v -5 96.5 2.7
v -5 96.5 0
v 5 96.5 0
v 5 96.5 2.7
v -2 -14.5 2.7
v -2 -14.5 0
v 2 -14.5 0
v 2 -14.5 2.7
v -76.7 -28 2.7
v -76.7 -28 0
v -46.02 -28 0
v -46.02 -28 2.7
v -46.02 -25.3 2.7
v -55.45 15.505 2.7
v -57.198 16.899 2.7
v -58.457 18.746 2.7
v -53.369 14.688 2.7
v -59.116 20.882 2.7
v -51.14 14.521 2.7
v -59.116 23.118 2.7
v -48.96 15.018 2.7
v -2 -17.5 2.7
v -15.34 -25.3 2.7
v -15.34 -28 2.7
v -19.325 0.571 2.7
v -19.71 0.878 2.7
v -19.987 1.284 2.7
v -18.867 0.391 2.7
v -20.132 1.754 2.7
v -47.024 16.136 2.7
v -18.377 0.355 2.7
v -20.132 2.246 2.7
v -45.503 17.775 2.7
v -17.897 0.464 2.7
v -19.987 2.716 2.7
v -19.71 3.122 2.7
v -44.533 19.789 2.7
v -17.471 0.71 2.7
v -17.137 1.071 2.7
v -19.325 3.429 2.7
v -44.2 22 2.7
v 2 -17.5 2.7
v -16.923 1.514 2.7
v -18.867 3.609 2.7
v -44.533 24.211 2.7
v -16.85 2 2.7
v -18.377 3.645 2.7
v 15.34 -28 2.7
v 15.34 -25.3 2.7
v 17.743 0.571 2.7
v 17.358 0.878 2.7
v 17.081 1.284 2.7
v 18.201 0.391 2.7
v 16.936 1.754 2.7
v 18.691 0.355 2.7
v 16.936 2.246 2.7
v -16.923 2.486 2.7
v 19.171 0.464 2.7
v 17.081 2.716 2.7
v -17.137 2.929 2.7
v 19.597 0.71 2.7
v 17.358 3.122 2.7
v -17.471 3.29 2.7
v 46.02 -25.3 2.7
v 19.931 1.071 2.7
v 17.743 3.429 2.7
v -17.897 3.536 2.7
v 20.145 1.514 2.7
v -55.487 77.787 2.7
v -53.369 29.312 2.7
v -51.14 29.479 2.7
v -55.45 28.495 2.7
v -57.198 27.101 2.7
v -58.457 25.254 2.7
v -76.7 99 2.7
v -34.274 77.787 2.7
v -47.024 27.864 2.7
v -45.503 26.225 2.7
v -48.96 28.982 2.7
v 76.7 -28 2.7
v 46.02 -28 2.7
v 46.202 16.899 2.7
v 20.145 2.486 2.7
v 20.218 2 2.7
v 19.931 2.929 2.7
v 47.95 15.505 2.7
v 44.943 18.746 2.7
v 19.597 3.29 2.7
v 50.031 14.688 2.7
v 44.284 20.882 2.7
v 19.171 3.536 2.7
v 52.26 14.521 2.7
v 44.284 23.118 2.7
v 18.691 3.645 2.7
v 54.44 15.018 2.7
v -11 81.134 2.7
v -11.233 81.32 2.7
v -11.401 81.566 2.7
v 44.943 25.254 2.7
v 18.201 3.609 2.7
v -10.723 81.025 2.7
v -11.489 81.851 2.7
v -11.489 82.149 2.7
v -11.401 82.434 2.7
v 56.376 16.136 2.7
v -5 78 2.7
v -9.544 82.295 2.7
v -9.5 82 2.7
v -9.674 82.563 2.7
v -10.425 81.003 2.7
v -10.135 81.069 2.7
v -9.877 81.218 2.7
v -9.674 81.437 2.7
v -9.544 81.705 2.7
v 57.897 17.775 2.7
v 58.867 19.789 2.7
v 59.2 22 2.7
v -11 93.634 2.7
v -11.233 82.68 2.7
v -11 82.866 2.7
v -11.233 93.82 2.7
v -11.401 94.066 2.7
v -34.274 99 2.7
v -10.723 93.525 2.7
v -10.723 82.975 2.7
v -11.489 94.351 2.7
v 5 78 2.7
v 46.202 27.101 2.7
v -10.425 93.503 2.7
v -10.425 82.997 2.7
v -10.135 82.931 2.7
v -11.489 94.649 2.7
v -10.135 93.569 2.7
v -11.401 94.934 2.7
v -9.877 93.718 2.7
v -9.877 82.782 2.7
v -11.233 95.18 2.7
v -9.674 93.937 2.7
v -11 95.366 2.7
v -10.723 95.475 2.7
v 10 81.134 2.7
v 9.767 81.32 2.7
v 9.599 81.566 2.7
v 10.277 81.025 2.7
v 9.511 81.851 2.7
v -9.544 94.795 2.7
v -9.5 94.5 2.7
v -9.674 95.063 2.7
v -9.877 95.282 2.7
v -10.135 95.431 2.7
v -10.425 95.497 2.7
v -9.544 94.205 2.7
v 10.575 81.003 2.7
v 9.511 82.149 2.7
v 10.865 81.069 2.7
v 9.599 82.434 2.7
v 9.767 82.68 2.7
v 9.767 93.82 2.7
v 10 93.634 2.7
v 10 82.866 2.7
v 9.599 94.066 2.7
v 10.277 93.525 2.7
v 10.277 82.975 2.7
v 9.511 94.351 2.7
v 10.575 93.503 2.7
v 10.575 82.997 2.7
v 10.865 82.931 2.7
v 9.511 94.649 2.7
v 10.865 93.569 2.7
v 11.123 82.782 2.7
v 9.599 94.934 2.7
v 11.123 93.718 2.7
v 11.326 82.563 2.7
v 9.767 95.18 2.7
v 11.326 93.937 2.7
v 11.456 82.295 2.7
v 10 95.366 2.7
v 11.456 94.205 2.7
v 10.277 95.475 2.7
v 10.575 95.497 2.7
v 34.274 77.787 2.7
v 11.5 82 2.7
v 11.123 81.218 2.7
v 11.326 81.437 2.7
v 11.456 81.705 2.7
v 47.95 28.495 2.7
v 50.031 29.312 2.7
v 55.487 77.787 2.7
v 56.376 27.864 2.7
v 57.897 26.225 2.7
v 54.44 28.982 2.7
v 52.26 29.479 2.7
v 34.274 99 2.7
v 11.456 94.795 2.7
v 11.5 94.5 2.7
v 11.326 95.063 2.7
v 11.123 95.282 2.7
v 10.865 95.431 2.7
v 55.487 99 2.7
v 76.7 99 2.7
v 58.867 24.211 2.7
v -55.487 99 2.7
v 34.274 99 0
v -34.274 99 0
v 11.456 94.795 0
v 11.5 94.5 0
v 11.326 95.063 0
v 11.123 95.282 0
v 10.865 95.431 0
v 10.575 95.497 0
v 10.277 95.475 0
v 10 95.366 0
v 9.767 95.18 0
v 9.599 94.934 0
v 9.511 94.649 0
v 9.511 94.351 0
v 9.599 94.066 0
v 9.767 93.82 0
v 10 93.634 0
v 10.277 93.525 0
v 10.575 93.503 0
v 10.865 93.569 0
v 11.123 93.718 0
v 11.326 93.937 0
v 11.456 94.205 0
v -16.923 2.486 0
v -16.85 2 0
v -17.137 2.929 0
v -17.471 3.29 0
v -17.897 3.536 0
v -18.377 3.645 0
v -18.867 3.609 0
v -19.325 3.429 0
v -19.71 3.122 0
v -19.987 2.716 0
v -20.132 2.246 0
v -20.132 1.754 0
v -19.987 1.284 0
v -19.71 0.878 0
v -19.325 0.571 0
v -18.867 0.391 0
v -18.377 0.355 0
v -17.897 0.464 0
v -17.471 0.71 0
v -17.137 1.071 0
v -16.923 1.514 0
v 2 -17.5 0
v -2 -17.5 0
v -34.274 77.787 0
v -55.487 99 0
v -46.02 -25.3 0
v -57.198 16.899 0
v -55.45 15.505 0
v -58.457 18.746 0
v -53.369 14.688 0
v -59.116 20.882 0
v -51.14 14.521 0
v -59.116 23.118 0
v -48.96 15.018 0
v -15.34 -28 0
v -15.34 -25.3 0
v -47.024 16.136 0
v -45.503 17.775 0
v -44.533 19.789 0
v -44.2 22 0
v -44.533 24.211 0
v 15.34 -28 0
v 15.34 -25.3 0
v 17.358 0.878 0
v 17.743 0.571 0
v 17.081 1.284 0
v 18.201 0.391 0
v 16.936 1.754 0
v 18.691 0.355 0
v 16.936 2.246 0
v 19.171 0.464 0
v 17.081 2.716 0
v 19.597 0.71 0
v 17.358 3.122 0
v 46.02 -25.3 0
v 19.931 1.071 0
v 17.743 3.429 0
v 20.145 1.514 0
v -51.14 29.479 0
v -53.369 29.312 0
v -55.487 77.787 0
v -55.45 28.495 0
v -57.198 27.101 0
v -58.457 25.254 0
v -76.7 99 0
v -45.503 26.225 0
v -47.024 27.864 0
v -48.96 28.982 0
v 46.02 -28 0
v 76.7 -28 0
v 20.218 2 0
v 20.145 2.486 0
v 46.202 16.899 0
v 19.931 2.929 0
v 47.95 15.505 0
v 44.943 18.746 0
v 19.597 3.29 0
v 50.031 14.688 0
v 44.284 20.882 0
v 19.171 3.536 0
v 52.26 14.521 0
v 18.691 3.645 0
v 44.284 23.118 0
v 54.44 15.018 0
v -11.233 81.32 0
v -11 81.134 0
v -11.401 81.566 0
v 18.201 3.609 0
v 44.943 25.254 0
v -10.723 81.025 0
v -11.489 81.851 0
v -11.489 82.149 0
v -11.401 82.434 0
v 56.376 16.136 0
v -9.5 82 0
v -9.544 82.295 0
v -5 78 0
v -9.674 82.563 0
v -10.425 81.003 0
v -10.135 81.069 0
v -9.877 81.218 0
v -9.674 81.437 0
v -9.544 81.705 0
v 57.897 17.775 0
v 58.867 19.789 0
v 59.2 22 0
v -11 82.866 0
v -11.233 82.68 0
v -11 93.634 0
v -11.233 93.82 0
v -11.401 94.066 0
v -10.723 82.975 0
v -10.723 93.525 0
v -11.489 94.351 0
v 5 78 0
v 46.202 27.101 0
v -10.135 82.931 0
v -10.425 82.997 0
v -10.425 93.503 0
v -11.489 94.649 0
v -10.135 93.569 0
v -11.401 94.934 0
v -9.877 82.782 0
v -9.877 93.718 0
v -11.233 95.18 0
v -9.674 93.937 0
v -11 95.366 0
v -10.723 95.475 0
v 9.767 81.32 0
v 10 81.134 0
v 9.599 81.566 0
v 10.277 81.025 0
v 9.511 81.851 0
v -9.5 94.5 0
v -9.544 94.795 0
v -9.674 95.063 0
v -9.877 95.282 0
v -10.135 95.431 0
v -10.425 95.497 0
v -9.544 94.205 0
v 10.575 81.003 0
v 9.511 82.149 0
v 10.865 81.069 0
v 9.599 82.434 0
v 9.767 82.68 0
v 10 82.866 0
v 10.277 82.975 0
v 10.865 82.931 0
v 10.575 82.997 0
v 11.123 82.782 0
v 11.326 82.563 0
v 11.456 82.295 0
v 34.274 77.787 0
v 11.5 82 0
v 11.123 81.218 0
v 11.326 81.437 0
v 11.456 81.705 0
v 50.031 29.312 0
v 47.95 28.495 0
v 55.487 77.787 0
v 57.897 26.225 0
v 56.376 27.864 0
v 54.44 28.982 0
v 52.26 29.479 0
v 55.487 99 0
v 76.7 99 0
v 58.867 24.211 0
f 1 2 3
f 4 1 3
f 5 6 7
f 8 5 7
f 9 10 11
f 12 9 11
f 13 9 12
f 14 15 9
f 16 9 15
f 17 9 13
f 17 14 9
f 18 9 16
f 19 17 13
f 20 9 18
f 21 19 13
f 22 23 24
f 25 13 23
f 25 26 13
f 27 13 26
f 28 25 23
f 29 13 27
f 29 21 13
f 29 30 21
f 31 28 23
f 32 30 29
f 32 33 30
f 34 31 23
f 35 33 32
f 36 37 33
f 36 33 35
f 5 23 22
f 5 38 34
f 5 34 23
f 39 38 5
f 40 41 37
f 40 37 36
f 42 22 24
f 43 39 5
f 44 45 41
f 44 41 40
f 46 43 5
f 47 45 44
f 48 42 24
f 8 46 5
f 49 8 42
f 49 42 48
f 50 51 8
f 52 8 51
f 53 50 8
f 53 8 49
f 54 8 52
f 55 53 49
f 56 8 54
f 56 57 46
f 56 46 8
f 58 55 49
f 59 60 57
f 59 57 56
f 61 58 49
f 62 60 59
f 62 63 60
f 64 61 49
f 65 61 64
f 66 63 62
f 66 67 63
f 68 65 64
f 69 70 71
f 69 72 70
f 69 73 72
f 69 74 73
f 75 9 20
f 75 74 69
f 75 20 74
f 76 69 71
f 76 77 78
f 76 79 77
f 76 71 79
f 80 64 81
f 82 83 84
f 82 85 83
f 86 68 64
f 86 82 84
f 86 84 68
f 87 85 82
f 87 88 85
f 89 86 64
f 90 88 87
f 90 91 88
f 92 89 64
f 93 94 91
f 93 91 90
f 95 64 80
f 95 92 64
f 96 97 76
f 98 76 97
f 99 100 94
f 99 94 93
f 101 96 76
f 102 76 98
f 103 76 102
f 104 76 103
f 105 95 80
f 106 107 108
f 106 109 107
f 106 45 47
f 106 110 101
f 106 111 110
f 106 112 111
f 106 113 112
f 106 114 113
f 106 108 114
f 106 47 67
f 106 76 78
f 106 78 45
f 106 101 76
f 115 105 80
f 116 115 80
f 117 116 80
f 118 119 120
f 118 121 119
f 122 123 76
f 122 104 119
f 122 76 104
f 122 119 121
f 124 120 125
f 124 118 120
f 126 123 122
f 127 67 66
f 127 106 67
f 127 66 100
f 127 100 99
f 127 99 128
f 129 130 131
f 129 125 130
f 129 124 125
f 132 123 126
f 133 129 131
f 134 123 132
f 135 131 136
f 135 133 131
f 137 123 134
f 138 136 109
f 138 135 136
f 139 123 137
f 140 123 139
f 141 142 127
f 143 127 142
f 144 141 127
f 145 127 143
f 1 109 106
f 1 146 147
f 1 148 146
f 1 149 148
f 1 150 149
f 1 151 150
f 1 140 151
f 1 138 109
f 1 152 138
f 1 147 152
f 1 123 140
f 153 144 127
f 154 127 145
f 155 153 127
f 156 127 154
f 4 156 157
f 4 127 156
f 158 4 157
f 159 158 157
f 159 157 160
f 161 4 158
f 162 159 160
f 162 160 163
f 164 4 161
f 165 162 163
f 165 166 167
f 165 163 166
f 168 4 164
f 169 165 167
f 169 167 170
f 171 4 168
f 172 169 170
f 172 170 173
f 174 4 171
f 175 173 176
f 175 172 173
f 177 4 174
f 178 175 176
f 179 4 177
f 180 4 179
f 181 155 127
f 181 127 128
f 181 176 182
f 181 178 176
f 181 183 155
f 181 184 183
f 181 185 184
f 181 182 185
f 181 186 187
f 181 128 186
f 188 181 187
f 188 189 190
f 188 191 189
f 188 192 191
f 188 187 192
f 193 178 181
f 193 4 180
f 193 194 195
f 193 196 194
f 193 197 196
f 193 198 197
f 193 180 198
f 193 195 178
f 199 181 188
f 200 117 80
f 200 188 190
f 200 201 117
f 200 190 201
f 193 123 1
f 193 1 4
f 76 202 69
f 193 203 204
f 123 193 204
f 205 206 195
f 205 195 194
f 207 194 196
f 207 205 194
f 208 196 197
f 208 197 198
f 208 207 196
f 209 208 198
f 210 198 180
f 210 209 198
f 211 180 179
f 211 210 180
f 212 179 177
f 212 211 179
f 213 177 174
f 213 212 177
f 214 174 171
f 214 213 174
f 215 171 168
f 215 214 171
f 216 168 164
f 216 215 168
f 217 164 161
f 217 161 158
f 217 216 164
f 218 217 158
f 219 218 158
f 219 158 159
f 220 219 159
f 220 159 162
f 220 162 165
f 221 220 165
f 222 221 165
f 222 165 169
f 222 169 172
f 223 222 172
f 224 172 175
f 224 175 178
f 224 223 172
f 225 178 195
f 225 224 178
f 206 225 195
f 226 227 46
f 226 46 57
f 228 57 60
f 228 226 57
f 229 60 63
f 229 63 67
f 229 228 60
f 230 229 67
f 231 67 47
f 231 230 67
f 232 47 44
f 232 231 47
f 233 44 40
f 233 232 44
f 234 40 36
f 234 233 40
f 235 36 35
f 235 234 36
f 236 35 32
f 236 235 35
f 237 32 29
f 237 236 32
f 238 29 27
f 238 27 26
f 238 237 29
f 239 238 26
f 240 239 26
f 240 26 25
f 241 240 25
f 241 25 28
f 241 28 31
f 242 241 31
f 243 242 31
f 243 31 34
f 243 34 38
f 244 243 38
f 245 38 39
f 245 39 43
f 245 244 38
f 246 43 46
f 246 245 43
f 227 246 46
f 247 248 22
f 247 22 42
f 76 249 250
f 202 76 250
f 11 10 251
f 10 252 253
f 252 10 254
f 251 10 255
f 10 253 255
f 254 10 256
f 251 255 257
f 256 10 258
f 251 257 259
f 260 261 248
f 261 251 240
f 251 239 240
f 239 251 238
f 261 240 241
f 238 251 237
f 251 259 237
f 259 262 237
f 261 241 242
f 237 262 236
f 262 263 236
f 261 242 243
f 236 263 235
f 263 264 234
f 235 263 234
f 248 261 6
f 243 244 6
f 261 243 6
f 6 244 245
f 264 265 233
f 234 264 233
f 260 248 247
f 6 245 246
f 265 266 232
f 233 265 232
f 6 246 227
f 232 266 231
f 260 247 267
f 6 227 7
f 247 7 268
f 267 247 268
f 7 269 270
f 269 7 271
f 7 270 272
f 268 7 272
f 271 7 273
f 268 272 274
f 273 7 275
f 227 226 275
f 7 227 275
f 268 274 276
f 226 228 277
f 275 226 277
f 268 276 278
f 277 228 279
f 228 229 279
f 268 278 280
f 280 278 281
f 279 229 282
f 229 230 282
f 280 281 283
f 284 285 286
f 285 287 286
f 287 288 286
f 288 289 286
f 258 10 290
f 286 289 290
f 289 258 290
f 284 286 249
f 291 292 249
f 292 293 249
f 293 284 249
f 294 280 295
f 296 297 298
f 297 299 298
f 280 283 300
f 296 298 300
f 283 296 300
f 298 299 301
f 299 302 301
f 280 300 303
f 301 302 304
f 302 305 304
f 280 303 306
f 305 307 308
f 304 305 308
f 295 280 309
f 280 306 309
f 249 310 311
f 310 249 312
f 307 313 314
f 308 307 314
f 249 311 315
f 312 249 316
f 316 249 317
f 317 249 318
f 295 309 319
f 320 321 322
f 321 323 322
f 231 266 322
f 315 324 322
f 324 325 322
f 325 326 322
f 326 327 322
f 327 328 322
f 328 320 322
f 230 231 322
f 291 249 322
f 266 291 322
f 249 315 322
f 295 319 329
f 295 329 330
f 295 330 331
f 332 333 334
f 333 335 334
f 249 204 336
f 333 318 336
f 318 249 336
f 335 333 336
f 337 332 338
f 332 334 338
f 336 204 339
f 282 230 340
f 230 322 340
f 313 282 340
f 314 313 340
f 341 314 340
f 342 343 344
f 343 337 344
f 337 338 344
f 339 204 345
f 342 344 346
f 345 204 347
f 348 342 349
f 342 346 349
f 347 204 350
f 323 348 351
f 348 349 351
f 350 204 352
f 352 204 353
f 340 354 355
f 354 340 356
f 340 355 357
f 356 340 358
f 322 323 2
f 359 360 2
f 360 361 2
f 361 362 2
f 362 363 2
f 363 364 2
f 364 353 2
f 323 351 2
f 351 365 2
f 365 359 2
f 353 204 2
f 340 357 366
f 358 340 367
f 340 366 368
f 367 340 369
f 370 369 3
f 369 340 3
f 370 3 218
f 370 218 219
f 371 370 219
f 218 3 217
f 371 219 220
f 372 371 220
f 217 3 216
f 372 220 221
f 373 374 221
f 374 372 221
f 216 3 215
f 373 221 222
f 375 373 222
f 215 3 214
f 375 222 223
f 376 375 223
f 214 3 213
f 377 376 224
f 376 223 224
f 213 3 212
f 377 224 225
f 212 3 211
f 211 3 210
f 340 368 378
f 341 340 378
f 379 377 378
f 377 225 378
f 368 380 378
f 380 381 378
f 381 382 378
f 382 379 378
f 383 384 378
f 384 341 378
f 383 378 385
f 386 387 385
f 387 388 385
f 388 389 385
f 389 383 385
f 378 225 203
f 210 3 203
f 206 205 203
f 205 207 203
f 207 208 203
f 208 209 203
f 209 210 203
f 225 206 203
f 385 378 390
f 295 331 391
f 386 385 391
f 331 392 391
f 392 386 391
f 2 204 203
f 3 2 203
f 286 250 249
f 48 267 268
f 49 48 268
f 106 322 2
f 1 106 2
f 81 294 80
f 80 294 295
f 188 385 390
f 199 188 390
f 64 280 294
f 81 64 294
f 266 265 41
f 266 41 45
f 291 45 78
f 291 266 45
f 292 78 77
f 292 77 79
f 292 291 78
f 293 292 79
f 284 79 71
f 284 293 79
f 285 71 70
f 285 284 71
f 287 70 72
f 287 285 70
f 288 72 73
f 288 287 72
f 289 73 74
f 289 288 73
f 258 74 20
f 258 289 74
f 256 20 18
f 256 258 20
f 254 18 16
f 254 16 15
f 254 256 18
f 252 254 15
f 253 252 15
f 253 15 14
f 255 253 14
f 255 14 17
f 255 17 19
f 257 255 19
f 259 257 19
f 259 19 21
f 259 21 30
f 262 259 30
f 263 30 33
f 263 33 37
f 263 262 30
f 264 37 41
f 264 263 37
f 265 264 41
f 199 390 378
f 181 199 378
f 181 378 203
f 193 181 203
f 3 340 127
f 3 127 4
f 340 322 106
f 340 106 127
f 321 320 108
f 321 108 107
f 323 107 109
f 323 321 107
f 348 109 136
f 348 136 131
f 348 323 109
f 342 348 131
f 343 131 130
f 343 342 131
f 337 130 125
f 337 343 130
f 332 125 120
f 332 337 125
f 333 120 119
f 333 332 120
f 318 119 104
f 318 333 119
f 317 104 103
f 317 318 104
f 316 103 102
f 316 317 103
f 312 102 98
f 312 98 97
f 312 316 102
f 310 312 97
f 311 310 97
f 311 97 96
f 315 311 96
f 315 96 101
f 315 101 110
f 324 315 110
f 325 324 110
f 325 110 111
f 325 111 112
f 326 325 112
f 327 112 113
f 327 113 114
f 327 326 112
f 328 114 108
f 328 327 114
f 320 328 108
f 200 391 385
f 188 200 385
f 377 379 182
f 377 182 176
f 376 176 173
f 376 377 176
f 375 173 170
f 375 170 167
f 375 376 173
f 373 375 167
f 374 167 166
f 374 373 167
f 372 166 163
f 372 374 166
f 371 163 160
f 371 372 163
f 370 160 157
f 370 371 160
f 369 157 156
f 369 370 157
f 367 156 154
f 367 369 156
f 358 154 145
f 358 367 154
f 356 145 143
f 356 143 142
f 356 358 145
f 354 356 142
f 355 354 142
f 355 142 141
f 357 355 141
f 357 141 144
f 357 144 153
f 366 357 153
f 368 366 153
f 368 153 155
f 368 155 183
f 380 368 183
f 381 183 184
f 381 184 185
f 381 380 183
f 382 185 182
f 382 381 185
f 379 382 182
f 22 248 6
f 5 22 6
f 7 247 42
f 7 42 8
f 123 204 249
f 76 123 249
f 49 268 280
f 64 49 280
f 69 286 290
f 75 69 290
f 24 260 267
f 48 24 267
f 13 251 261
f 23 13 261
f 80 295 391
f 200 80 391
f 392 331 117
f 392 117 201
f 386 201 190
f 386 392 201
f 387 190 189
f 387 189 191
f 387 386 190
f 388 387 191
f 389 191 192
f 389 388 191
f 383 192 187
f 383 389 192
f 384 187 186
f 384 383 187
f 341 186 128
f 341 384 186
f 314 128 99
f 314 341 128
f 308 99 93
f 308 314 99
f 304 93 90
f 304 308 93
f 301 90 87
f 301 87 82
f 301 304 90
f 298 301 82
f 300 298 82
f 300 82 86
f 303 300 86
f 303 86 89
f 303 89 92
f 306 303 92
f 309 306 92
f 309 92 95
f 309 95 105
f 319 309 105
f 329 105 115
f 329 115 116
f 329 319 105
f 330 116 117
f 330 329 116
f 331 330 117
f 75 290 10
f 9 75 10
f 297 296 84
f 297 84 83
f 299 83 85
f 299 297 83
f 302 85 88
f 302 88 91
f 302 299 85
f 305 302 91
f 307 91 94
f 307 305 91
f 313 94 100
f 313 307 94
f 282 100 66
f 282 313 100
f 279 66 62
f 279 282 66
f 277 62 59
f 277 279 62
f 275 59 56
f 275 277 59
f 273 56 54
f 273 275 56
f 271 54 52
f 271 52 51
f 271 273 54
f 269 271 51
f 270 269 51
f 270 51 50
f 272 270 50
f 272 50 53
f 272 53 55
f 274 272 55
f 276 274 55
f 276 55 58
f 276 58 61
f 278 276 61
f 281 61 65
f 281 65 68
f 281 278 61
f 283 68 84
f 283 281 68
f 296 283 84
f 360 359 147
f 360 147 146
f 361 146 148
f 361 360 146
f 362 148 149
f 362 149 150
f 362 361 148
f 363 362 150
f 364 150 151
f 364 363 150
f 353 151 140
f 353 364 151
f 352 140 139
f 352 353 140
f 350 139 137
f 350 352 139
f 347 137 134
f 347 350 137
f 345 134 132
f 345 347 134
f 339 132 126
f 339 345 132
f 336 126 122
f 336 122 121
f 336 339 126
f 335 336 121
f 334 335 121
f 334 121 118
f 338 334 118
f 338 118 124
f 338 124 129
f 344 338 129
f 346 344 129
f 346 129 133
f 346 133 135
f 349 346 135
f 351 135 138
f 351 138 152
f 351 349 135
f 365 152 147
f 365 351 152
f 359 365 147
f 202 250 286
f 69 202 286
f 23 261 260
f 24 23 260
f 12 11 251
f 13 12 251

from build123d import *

# Parameters (mm, degrees)
SKETCH1_R           = 1.65
SKETCH1_R_2         = 7.5
SKETCH1_R_3         = 1
SKETCH1_W           = 4
SKETCH1_H           = 3
SKETCH1_W_2         = 10
SKETCH1_H_2         = 18.5
BOSS_EXTRUDE3_DEPTH = 2.7


with BuildPart() as part:
    # Sketch1 → Boss-Extrude3 (new body)
    with BuildSketch(Plane.XY):
        Polygon((-46.02, -28), (-46.02, -25.3), (-15.34, -25.3), (-15.34, -28), (15.34, -28), (15.34, -25.3), (46.02, -25.3), (46.02, -28), (76.7, -28), (76.7, 99), (55.486796564, 77.786796564), (55.486796564, 99), (34.273593129, 77.786796564), (34.273593129, 99), (-34.273593129, 99), (-34.273593129, 77.786796564), (-55.486796564, 99), (-55.486796564, 77.786796564), (-76.7, 99), (-76.7, -28), align=None)
        with Locations((-18.5, 2)):
            Circle(SKETCH1_R, mode=Mode.SUBTRACT)
        with Locations((18.567940233, 2)):
            Circle(SKETCH1_R, mode=Mode.SUBTRACT)
        with Locations((-51.7, 22)):
            Circle(SKETCH1_R_2, mode=Mode.SUBTRACT)
        with Locations((51.7, 22)):
            Circle(SKETCH1_R_2, mode=Mode.SUBTRACT)
        with Locations((10.5, 94.5)):
            Circle(SKETCH1_R_3, mode=Mode.SUBTRACT)
        with Locations((-10.5, 82)):
            Circle(SKETCH1_R_3, mode=Mode.SUBTRACT)
        with Locations((-10.5, 94.5)):
            Circle(SKETCH1_R_3, mode=Mode.SUBTRACT)
        with Locations((10.5, 82)):
            Circle(SKETCH1_R_3, mode=Mode.SUBTRACT)
        with Locations((0, -16)):
            Rectangle(SKETCH1_W, SKETCH1_H, mode=Mode.SUBTRACT)
        with Locations((0, 87.25)):
            Rectangle(SKETCH1_W_2, SKETCH1_H_2, mode=Mode.SUBTRACT)
    extrude(amount=BOSS_EXTRUDE3_DEPTH)


solid = part.part
